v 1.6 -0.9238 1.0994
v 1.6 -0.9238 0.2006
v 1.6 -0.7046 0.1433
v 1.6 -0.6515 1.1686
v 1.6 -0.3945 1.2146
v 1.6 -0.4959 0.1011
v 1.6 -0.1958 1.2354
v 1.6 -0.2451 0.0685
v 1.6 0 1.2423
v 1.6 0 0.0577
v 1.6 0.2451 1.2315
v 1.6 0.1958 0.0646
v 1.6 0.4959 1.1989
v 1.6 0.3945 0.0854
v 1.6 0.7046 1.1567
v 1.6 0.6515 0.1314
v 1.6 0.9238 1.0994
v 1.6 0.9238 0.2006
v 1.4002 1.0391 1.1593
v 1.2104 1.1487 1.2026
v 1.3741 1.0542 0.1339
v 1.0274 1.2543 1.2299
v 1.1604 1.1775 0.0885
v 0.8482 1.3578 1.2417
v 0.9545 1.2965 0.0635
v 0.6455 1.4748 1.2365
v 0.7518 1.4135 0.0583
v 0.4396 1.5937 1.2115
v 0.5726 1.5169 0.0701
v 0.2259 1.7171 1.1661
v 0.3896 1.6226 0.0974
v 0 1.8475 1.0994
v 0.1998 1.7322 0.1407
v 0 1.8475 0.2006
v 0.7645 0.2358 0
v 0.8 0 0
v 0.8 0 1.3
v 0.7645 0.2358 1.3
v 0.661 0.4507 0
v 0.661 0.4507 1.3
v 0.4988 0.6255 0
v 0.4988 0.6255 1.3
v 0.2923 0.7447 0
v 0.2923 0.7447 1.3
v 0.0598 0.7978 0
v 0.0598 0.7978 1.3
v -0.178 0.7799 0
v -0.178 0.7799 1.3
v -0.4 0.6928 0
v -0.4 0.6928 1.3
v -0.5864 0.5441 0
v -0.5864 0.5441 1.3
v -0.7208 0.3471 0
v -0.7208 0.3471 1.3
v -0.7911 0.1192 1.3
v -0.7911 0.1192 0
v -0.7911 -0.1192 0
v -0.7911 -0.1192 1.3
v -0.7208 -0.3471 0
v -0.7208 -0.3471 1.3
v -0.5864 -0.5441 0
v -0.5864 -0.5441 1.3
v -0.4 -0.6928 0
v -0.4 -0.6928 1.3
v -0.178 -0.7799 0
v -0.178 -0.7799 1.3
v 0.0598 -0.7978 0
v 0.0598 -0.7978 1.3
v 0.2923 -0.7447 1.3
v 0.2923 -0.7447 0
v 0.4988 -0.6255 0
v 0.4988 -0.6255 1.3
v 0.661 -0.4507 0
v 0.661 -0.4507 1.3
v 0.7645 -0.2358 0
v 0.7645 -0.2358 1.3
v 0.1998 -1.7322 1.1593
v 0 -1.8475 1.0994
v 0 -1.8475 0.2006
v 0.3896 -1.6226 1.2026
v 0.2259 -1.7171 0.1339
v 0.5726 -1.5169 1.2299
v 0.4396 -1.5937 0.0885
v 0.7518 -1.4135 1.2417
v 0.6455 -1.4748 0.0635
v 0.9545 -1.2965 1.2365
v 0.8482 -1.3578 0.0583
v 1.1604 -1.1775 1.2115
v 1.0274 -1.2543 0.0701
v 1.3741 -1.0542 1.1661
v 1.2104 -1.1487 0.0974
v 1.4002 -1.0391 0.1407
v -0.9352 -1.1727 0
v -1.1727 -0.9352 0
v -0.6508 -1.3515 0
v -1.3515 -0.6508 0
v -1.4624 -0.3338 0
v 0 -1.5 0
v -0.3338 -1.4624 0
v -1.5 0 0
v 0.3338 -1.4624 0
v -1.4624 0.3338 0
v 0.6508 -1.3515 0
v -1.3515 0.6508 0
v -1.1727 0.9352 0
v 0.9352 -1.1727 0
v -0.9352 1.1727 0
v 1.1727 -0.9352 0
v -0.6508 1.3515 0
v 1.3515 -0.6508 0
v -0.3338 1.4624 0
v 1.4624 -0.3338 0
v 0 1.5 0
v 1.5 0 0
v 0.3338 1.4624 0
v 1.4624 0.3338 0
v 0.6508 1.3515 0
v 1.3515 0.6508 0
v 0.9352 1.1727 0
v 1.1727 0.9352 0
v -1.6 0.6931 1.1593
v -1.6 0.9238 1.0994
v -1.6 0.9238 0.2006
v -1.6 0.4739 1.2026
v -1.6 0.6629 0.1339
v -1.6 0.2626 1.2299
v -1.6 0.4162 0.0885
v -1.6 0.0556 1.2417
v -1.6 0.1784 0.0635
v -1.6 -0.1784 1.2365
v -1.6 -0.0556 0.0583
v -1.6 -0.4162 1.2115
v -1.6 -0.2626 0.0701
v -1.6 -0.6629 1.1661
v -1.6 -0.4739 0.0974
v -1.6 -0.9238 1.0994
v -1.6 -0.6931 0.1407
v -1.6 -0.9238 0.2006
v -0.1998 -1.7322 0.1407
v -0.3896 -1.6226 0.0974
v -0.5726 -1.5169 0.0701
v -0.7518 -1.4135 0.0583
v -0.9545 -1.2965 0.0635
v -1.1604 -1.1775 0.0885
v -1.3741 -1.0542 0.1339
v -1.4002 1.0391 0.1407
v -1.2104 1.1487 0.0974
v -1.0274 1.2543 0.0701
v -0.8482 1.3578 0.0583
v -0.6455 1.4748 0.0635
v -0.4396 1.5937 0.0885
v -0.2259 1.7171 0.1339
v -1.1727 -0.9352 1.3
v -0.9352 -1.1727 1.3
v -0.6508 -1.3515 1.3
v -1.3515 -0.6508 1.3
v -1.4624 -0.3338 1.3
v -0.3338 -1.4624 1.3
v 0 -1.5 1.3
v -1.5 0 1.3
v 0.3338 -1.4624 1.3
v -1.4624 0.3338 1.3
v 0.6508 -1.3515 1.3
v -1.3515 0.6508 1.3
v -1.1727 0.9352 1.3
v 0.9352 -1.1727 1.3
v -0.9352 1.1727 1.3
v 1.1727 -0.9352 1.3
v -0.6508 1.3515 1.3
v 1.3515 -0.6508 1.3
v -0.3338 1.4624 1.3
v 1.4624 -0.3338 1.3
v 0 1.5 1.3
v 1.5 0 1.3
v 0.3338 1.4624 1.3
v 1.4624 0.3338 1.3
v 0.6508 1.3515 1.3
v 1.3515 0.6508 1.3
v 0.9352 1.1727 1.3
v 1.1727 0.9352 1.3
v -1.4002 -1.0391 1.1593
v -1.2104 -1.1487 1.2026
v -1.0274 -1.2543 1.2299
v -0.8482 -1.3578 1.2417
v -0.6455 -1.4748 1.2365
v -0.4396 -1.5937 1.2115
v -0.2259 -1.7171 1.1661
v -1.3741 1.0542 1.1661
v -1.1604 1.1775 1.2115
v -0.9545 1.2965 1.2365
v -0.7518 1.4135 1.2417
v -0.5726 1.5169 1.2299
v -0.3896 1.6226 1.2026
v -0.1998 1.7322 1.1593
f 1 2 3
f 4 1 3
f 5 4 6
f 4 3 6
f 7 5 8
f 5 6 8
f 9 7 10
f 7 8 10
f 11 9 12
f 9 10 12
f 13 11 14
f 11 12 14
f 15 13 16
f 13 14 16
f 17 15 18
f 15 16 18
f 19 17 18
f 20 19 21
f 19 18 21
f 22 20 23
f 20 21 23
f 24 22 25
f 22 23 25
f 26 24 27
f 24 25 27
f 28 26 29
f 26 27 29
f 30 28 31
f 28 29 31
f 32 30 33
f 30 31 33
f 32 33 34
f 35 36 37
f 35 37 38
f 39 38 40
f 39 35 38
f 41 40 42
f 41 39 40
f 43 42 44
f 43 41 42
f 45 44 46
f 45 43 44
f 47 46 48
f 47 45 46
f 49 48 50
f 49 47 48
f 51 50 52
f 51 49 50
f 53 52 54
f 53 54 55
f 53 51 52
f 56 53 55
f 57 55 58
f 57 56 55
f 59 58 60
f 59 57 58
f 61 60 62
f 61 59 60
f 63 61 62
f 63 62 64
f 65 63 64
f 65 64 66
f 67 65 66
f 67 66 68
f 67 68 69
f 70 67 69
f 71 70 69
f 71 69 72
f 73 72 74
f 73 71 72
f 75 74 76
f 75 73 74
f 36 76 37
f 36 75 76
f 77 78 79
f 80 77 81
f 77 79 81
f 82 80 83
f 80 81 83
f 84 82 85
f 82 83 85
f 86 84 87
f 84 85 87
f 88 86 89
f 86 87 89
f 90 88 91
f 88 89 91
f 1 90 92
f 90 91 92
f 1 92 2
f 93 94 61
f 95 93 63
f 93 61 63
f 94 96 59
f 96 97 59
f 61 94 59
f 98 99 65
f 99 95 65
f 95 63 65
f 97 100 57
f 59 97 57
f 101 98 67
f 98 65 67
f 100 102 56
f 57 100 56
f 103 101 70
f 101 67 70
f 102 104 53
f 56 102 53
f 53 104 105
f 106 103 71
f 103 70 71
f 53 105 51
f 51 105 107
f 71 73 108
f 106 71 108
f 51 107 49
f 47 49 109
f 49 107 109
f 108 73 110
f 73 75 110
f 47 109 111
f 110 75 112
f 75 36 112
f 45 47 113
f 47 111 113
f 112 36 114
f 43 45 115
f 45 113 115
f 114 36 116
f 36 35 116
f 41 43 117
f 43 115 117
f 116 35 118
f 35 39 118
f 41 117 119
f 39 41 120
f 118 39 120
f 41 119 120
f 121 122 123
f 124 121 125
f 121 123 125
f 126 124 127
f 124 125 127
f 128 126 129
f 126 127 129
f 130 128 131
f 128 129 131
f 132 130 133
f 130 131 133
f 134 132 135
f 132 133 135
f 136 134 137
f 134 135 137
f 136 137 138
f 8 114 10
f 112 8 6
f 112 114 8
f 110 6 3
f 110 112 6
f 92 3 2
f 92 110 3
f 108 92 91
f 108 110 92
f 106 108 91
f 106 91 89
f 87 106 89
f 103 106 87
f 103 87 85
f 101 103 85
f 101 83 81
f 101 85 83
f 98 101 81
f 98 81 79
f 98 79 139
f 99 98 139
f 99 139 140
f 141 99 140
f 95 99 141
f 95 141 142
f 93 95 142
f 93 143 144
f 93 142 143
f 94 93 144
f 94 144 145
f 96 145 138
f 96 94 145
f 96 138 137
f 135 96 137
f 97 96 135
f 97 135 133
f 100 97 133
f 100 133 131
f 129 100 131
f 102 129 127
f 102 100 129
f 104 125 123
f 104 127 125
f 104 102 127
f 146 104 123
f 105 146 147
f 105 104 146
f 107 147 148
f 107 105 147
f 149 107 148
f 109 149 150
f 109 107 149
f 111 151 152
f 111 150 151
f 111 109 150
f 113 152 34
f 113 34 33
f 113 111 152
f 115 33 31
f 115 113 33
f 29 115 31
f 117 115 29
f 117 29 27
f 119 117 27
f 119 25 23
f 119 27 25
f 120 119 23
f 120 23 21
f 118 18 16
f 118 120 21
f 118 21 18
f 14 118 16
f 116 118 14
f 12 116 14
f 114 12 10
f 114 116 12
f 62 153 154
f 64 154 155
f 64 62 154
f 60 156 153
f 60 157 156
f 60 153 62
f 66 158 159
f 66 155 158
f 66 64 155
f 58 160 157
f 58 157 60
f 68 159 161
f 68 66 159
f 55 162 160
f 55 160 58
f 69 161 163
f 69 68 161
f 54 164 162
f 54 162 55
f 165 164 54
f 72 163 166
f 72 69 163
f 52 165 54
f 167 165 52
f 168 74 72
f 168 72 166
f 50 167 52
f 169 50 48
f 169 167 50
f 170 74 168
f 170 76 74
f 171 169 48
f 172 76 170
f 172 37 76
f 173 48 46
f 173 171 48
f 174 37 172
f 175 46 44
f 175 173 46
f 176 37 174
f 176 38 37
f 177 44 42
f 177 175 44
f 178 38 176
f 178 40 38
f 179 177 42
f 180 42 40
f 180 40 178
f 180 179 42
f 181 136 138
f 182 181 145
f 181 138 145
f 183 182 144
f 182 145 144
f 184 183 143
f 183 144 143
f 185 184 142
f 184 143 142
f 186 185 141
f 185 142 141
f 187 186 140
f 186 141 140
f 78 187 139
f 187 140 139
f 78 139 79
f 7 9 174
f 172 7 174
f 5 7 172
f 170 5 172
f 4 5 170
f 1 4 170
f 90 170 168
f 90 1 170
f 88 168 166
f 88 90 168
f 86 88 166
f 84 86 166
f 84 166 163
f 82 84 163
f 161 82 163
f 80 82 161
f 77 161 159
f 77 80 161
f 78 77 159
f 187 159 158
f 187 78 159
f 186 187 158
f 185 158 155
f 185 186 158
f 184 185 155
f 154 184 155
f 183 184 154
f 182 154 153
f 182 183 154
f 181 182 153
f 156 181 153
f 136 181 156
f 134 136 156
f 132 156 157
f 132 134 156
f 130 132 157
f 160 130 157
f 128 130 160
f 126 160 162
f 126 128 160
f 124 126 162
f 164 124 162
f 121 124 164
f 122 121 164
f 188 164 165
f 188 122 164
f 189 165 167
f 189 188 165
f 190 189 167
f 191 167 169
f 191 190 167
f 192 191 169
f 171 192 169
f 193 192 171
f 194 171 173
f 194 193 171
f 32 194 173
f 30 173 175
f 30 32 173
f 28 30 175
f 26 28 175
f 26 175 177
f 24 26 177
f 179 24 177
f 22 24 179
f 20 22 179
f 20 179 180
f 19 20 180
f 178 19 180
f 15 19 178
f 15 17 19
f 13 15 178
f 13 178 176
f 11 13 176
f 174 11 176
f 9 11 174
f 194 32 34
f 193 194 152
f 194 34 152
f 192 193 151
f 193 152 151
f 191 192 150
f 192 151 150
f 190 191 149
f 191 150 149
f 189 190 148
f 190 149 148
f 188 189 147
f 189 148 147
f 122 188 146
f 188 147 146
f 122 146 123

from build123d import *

# Parameters (mm, degrees)
SKETCH1_R      = 0.8
EXTRUDE1_DEPTH = 1.3


with BuildPart() as part:
    # Sketch1 → Extrude1 (new body)
    with BuildSketch(Plane.XY):
        Polygon((0, 1.847520861), (-1.6, 0.923760431), (-1.6, -0.923760431), (0, -1.847520861), (1.6, -0.923760431), (1.6, 0.923760431), align=None)
        Circle(SKETCH1_R, mode=Mode.SUBTRACT)
    extrude(amount=EXTRUDE1_DEPTH)

    # Sketch2 → Cut-Revolve1 (revolve, cut)
    with BuildSketch(Plane(origin=(0, 0, 0), x_dir=(1, 0, 0), z_dir=(0, 1, 0)), mode=Mode.PRIVATE) as cut_revolve1_sk:
        Polygon((-3.192737518, -1.3), (-1.5, -1.3), (-2.625833025, -0.65), (-1.5, 0), (-3.192737518, 0), align=None)
    revolve(cut_revolve1_sk.sketch.rotate(Axis((0, 0, 0), (0, 0, -1)), 180), axis=Axis((0, 0, 0), (0, 0, -1)), mode=Mode.SUBTRACT)


solid = part.part
